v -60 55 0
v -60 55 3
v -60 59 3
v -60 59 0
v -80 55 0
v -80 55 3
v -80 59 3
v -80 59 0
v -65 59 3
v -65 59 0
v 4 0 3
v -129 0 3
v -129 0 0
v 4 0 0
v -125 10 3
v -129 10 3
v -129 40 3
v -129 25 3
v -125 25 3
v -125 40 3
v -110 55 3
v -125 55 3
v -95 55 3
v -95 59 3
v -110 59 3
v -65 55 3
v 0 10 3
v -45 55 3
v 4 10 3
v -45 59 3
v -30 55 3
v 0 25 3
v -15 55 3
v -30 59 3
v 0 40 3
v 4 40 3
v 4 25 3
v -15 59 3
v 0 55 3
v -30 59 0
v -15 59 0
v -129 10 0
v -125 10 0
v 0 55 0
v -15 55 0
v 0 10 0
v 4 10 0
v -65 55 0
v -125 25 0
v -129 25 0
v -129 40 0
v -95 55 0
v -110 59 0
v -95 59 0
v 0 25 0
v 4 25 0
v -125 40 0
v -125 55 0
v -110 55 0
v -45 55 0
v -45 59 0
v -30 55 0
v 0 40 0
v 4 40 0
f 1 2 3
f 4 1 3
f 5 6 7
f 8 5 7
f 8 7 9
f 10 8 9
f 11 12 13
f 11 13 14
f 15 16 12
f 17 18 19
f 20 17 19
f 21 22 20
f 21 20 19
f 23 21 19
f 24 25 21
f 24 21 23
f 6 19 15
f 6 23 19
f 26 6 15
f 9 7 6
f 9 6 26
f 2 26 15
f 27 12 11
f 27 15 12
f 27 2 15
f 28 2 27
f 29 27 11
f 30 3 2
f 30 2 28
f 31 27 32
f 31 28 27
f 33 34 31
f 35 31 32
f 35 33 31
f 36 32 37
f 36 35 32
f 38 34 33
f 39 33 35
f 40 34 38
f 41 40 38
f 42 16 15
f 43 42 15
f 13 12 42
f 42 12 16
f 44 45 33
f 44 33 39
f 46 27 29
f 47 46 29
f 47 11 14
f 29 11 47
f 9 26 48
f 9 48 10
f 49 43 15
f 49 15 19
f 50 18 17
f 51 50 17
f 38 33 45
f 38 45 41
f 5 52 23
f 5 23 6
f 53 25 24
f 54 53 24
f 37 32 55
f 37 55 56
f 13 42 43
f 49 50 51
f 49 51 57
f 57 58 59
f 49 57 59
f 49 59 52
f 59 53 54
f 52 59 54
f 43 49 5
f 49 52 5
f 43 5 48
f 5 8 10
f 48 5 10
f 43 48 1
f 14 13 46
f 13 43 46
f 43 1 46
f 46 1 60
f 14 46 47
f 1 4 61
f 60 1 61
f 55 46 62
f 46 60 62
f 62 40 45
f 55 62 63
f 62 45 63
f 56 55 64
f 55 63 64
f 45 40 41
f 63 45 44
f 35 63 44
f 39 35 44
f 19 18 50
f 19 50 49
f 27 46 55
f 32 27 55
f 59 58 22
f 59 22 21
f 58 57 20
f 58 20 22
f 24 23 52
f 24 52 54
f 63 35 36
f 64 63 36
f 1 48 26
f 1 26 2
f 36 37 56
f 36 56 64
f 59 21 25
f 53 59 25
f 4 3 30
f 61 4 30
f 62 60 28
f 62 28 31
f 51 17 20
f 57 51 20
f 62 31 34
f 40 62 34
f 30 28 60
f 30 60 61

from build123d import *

# Parameters (mm, degrees)
SKETCH1_W           = 125
SKETCH1_H           = 55
BOSS_EXTRUDE1_DEPTH = 3
SKETCH2_W           = 4
SKETCH2_H           = 10
SKETCH2_H_2         = 15
SKETCH2_W_2         = 15
SKETCH2_H_3         = 4
BOSS_EXTRUDE2_DEPTH = 3


with BuildPart() as part:
    # Sketch1 → Boss-Extrude1 (new body)
    with BuildSketch(Plane.XY):
        with Locations((-62.5, 27.5)):
            Rectangle(SKETCH1_W, SKETCH1_H)
    extrude(amount=BOSS_EXTRUDE1_DEPTH)

    # Sketch2 → Boss-Extrude2 (add)
    with BuildSketch(Plane.XY.offset(3)):
        with Locations((-127, 5)):
            Rectangle(SKETCH2_W, SKETCH2_H)
        with Locations((2, 5)):
            Rectangle(SKETCH2_W, SKETCH2_H)
        with Locations((2, 32.5)):
            Rectangle(SKETCH2_W, SKETCH2_H_2)
        with Locations((-127, 32.5)):
            Rectangle(SKETCH2_W, SKETCH2_H_2)
        with Locations((-72.5, 57)):
            Rectangle(SKETCH2_W_2, SKETCH2_H_3)
        with Locations((-22.5, 57)):
            Rectangle(SKETCH2_W_2, SKETCH2_H_3)
        with Locations((-102.5, 57)):
            Rectangle(SKETCH2_W_2, SKETCH2_H_3)
        with Locations((-52.5, 57)):
            Rectangle(SKETCH2_W_2, SKETCH2_H_3)
    extrude(amount=-BOSS_EXTRUDE2_DEPTH)


solid = part.part
